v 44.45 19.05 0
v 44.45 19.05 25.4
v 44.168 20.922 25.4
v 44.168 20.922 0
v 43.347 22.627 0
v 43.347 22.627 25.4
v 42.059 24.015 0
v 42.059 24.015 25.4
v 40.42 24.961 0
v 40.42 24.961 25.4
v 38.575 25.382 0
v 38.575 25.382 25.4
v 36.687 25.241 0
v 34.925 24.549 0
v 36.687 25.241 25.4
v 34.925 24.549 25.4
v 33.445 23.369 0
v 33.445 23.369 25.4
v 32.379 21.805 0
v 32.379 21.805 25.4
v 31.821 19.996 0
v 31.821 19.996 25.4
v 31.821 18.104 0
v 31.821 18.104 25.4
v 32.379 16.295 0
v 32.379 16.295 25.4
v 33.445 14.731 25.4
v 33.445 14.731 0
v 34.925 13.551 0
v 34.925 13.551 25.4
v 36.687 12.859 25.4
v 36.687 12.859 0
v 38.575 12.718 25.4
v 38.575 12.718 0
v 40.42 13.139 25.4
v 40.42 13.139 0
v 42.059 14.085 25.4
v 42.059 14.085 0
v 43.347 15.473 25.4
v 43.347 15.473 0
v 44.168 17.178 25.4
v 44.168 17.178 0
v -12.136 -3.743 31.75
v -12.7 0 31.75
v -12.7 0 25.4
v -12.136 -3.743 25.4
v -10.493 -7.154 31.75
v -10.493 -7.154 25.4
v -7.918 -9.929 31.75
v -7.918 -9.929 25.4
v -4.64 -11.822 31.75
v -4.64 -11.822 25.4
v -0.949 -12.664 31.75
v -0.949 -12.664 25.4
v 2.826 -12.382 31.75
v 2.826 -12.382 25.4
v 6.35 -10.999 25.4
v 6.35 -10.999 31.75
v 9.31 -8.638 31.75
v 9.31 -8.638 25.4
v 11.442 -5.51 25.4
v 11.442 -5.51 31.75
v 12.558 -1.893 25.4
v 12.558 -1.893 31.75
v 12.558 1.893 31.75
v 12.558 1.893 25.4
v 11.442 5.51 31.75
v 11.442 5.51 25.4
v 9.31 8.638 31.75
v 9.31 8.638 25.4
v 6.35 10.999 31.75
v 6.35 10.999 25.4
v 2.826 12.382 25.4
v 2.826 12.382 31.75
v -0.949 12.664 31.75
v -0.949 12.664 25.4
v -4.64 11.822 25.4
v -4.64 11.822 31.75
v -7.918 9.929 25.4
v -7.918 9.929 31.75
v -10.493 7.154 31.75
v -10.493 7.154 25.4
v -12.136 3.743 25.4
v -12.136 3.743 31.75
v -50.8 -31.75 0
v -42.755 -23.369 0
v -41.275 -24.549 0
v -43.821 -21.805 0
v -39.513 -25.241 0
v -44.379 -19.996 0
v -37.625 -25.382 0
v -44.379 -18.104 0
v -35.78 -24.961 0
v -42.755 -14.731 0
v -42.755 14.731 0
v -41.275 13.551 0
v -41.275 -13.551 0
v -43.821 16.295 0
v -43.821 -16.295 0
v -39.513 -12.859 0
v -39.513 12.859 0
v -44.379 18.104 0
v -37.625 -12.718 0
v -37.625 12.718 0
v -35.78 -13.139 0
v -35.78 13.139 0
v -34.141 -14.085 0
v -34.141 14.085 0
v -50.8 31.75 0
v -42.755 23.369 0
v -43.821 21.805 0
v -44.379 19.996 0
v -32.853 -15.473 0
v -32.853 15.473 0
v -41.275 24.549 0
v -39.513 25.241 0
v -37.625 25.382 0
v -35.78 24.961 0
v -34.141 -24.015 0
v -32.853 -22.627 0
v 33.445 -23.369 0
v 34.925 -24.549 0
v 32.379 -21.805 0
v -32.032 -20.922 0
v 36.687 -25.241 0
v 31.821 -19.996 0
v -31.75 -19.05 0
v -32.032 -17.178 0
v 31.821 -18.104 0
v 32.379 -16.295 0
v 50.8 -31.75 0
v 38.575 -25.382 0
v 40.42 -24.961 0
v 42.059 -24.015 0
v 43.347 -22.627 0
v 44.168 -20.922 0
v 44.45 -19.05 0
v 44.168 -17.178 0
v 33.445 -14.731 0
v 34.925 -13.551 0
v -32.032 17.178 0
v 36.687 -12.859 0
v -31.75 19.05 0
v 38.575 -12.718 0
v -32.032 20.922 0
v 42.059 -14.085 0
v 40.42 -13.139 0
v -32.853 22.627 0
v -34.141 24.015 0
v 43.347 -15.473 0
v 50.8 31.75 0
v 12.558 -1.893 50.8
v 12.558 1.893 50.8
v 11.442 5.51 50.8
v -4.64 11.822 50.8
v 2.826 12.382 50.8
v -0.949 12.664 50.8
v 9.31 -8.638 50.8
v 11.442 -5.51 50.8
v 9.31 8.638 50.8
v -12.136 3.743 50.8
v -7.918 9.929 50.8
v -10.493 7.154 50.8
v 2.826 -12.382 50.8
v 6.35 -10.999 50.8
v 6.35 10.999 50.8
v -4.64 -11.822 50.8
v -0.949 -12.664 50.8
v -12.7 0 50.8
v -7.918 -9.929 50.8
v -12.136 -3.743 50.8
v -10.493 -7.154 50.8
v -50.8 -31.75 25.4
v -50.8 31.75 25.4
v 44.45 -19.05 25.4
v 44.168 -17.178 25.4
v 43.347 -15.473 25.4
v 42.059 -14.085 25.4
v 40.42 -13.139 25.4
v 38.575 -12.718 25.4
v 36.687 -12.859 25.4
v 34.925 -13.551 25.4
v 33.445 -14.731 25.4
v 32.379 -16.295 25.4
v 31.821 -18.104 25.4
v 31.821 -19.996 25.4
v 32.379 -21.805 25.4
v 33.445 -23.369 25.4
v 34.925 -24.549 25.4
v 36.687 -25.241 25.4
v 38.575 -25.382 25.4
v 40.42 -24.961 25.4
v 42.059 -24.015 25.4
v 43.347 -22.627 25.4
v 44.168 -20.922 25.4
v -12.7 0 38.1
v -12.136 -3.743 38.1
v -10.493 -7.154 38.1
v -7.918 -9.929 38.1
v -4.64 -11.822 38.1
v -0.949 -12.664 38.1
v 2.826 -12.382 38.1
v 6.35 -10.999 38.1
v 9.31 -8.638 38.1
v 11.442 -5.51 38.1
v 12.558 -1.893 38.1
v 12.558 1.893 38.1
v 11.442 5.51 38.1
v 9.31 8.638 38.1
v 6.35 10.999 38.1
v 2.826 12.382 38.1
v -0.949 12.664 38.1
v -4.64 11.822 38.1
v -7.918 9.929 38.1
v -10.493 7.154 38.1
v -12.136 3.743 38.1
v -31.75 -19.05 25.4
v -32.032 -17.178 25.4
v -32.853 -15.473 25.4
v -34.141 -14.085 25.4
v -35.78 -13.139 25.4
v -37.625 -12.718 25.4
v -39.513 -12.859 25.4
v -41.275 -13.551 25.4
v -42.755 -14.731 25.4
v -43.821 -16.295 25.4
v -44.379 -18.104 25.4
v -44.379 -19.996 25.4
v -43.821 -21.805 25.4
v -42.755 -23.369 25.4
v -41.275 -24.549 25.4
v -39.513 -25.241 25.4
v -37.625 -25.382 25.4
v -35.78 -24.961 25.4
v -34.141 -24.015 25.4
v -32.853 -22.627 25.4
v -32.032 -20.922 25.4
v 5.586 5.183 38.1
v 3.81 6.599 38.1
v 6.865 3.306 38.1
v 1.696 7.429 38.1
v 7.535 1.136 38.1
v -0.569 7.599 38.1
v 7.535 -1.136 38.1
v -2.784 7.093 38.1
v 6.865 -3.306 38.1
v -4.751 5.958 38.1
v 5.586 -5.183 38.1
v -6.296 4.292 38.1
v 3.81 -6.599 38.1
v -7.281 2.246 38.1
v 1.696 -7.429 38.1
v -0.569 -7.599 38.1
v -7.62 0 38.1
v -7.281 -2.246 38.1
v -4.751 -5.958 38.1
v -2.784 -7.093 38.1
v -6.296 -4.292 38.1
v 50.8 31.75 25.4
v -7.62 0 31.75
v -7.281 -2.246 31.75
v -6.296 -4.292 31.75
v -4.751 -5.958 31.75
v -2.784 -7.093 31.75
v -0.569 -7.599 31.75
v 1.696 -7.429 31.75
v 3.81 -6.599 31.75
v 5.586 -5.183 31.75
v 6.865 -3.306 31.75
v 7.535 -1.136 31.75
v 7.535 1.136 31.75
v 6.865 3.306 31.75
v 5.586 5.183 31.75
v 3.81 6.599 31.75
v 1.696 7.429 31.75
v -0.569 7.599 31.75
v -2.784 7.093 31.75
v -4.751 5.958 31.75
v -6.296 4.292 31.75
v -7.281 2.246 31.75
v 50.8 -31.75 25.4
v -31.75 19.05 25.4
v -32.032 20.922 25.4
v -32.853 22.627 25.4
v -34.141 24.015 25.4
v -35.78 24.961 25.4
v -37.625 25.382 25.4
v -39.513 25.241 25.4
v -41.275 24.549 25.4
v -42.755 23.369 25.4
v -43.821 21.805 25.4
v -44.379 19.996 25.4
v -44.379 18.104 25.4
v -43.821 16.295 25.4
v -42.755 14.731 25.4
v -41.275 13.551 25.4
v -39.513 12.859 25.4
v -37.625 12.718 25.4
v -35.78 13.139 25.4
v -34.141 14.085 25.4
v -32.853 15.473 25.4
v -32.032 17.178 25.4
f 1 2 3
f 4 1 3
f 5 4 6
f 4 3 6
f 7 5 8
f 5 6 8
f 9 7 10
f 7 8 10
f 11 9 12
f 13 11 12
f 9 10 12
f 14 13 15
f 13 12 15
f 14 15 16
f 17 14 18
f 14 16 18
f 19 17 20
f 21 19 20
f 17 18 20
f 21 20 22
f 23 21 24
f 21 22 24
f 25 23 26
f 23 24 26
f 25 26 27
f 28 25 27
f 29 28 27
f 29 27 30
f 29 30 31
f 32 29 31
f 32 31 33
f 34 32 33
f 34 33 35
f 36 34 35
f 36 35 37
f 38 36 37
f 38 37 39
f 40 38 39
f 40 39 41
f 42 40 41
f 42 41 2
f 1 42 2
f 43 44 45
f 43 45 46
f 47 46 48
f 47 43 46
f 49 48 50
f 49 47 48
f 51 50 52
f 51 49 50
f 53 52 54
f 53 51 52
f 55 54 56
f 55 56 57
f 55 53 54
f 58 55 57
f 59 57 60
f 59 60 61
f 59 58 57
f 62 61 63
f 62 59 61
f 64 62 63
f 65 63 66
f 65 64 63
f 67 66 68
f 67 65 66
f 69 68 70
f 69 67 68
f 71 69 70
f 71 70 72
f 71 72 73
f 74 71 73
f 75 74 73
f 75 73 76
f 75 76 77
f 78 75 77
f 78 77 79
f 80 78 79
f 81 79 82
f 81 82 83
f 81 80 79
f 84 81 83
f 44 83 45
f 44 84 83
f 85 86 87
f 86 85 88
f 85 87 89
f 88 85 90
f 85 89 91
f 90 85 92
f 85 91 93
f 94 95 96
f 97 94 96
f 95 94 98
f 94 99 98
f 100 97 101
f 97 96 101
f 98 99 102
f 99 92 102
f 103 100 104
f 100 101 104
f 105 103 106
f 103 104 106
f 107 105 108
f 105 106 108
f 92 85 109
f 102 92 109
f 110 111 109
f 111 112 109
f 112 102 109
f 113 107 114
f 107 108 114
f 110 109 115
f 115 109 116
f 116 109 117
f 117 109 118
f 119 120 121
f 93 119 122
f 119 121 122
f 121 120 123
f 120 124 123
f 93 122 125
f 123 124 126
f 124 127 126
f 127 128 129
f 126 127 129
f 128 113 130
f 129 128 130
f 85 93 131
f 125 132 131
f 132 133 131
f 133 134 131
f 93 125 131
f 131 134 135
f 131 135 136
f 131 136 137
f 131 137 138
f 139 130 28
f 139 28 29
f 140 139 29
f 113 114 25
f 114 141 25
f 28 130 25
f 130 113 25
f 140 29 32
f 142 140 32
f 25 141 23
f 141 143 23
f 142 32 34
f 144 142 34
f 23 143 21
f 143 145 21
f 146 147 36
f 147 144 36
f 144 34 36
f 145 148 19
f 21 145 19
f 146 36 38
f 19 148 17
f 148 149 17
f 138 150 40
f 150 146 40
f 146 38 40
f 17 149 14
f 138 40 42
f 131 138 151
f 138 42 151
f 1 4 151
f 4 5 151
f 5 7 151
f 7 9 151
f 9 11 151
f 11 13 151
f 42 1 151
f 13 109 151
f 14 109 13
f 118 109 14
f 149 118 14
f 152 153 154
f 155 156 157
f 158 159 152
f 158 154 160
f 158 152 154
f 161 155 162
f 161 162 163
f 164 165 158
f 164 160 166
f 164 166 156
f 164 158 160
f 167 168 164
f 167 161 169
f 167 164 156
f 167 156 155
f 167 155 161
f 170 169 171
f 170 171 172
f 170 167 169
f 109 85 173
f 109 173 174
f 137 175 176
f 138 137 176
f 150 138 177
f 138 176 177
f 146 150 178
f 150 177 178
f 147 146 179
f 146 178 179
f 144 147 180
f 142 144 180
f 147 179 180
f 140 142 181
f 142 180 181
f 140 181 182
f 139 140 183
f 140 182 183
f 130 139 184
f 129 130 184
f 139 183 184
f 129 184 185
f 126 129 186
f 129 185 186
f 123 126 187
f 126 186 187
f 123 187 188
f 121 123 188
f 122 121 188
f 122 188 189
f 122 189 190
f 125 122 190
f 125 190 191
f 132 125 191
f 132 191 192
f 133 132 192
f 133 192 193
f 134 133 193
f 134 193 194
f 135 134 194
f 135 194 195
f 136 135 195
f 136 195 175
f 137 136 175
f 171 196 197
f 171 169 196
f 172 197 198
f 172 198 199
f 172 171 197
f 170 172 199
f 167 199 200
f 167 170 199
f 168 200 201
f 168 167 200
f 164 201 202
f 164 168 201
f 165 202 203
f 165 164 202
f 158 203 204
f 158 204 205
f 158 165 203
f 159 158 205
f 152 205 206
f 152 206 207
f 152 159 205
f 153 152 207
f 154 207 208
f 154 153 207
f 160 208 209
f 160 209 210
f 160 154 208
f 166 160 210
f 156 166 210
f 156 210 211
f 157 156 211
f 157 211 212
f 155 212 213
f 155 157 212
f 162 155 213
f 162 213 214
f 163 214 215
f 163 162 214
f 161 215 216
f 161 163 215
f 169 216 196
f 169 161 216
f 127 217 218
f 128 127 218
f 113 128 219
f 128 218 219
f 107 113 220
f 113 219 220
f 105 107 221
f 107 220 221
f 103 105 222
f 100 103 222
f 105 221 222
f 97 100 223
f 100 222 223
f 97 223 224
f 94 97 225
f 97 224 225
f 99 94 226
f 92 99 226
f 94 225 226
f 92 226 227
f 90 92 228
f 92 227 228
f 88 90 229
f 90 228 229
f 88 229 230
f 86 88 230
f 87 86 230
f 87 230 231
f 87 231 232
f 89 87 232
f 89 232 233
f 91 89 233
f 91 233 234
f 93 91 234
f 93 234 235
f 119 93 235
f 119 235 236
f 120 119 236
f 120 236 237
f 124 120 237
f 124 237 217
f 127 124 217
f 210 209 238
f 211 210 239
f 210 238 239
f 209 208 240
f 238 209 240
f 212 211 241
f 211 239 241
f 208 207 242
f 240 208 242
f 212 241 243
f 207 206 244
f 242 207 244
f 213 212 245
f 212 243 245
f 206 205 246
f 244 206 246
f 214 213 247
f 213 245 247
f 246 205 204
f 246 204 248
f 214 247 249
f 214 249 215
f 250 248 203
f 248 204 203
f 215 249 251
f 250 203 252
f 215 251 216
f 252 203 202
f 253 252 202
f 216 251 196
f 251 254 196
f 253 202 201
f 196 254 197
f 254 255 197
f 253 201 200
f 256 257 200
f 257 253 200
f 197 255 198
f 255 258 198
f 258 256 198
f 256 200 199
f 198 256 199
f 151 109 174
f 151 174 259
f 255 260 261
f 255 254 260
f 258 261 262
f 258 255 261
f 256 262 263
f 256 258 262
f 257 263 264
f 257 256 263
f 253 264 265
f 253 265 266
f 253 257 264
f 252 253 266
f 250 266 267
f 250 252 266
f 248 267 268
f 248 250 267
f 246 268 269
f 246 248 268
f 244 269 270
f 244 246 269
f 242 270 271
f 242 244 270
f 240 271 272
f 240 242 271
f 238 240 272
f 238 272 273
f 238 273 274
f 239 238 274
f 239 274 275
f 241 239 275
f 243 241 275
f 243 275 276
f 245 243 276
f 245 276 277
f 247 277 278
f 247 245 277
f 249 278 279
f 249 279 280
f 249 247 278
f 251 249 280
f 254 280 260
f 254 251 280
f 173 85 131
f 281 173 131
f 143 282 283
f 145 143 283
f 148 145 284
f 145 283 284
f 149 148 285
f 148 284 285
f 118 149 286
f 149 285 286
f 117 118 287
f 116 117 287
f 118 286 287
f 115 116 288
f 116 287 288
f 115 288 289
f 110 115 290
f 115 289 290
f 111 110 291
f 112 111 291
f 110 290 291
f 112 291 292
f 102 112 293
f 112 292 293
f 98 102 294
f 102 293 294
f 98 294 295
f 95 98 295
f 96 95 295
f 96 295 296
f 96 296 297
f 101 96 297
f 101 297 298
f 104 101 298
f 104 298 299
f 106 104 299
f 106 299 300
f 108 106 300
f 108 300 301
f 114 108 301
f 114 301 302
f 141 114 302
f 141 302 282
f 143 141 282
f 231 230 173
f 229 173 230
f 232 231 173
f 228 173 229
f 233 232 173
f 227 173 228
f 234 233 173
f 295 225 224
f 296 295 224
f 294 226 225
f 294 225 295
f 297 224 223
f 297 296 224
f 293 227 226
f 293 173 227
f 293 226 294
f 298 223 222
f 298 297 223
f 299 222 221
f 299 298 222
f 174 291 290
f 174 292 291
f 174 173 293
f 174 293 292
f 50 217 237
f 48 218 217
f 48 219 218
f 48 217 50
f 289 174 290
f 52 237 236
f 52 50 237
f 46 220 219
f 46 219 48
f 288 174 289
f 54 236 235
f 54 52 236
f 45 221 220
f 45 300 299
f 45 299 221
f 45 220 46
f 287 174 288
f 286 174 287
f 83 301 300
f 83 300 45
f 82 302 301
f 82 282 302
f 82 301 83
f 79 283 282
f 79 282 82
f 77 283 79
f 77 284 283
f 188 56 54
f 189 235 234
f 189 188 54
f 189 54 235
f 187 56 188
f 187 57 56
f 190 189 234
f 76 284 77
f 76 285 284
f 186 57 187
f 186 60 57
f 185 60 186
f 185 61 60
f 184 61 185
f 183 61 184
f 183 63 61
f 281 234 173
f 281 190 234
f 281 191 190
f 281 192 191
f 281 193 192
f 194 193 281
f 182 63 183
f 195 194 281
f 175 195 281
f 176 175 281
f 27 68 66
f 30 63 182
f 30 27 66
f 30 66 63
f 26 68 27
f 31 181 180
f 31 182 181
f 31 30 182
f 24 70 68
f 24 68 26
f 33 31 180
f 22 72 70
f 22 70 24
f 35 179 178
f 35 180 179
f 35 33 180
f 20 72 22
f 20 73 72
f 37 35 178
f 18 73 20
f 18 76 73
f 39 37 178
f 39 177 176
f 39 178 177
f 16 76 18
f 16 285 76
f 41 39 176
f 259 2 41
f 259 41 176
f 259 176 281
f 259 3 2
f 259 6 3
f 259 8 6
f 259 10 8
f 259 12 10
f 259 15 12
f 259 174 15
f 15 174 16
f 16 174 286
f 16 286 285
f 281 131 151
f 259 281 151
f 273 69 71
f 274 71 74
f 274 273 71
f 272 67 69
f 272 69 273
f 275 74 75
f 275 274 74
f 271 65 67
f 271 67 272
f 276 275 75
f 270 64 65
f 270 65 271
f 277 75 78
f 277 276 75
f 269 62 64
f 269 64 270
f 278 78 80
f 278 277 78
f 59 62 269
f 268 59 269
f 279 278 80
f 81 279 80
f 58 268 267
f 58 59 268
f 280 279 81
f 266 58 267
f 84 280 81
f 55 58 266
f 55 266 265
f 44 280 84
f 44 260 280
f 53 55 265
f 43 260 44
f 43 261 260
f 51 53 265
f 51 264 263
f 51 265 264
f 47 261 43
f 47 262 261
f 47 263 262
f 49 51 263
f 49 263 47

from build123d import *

# Parameters (mm, degrees)
F0_W     = 101.6
F0_H     = 63.5
F1_DEPTH = 25.4
F2_R     = 6.35
F3_DEPTH = 25.401
F4_W     = 12.7
F4_H     = 25.4
F6_W     = 13.615308
F6_H     = 6.35


with BuildPart() as f1:
    # F0 (on Top) → F1 (new body)
    with BuildSketch(Plane.XY):
        Rectangle(F0_W, F0_H)
    extrude(amount=F1_DEPTH)

    # F2 (on face) → F3 (cut, through all)
    with BuildSketch(Plane.XY.offset(25.4)):
        with Locations((-38.1, 19.05)):
            Circle(F2_R)
        with Locations((38.1, 19.05)):
            Circle(F2_R)
        with Locations((38.1, -19.05)):
            Circle(F2_R)
        with Locations((-38.1, -19.05)):
            Circle(F2_R)
    extrude(amount=-F3_DEPTH, mode=Mode.SUBTRACT)

    # F4 (on Front) → F5 (revolve)
    with BuildSketch(Plane.XZ):
        with Locations((-6.35, 38.1)):
            Rectangle(F4_W, F4_H)
    revolve(axis=Axis((0, 0, 38.1), (0, 0, 1)))

    # F6 (on Front) → F7 (revolve, cut)
    with BuildSketch(Plane.XZ):
        with Locations((-14.427654, 34.925)):
            Rectangle(F6_W, F6_H)
    revolve(axis=Axis((0, 0, 50.8), (0, 0, 1)), mode=Mode.SUBTRACT)


solid = f1.part
